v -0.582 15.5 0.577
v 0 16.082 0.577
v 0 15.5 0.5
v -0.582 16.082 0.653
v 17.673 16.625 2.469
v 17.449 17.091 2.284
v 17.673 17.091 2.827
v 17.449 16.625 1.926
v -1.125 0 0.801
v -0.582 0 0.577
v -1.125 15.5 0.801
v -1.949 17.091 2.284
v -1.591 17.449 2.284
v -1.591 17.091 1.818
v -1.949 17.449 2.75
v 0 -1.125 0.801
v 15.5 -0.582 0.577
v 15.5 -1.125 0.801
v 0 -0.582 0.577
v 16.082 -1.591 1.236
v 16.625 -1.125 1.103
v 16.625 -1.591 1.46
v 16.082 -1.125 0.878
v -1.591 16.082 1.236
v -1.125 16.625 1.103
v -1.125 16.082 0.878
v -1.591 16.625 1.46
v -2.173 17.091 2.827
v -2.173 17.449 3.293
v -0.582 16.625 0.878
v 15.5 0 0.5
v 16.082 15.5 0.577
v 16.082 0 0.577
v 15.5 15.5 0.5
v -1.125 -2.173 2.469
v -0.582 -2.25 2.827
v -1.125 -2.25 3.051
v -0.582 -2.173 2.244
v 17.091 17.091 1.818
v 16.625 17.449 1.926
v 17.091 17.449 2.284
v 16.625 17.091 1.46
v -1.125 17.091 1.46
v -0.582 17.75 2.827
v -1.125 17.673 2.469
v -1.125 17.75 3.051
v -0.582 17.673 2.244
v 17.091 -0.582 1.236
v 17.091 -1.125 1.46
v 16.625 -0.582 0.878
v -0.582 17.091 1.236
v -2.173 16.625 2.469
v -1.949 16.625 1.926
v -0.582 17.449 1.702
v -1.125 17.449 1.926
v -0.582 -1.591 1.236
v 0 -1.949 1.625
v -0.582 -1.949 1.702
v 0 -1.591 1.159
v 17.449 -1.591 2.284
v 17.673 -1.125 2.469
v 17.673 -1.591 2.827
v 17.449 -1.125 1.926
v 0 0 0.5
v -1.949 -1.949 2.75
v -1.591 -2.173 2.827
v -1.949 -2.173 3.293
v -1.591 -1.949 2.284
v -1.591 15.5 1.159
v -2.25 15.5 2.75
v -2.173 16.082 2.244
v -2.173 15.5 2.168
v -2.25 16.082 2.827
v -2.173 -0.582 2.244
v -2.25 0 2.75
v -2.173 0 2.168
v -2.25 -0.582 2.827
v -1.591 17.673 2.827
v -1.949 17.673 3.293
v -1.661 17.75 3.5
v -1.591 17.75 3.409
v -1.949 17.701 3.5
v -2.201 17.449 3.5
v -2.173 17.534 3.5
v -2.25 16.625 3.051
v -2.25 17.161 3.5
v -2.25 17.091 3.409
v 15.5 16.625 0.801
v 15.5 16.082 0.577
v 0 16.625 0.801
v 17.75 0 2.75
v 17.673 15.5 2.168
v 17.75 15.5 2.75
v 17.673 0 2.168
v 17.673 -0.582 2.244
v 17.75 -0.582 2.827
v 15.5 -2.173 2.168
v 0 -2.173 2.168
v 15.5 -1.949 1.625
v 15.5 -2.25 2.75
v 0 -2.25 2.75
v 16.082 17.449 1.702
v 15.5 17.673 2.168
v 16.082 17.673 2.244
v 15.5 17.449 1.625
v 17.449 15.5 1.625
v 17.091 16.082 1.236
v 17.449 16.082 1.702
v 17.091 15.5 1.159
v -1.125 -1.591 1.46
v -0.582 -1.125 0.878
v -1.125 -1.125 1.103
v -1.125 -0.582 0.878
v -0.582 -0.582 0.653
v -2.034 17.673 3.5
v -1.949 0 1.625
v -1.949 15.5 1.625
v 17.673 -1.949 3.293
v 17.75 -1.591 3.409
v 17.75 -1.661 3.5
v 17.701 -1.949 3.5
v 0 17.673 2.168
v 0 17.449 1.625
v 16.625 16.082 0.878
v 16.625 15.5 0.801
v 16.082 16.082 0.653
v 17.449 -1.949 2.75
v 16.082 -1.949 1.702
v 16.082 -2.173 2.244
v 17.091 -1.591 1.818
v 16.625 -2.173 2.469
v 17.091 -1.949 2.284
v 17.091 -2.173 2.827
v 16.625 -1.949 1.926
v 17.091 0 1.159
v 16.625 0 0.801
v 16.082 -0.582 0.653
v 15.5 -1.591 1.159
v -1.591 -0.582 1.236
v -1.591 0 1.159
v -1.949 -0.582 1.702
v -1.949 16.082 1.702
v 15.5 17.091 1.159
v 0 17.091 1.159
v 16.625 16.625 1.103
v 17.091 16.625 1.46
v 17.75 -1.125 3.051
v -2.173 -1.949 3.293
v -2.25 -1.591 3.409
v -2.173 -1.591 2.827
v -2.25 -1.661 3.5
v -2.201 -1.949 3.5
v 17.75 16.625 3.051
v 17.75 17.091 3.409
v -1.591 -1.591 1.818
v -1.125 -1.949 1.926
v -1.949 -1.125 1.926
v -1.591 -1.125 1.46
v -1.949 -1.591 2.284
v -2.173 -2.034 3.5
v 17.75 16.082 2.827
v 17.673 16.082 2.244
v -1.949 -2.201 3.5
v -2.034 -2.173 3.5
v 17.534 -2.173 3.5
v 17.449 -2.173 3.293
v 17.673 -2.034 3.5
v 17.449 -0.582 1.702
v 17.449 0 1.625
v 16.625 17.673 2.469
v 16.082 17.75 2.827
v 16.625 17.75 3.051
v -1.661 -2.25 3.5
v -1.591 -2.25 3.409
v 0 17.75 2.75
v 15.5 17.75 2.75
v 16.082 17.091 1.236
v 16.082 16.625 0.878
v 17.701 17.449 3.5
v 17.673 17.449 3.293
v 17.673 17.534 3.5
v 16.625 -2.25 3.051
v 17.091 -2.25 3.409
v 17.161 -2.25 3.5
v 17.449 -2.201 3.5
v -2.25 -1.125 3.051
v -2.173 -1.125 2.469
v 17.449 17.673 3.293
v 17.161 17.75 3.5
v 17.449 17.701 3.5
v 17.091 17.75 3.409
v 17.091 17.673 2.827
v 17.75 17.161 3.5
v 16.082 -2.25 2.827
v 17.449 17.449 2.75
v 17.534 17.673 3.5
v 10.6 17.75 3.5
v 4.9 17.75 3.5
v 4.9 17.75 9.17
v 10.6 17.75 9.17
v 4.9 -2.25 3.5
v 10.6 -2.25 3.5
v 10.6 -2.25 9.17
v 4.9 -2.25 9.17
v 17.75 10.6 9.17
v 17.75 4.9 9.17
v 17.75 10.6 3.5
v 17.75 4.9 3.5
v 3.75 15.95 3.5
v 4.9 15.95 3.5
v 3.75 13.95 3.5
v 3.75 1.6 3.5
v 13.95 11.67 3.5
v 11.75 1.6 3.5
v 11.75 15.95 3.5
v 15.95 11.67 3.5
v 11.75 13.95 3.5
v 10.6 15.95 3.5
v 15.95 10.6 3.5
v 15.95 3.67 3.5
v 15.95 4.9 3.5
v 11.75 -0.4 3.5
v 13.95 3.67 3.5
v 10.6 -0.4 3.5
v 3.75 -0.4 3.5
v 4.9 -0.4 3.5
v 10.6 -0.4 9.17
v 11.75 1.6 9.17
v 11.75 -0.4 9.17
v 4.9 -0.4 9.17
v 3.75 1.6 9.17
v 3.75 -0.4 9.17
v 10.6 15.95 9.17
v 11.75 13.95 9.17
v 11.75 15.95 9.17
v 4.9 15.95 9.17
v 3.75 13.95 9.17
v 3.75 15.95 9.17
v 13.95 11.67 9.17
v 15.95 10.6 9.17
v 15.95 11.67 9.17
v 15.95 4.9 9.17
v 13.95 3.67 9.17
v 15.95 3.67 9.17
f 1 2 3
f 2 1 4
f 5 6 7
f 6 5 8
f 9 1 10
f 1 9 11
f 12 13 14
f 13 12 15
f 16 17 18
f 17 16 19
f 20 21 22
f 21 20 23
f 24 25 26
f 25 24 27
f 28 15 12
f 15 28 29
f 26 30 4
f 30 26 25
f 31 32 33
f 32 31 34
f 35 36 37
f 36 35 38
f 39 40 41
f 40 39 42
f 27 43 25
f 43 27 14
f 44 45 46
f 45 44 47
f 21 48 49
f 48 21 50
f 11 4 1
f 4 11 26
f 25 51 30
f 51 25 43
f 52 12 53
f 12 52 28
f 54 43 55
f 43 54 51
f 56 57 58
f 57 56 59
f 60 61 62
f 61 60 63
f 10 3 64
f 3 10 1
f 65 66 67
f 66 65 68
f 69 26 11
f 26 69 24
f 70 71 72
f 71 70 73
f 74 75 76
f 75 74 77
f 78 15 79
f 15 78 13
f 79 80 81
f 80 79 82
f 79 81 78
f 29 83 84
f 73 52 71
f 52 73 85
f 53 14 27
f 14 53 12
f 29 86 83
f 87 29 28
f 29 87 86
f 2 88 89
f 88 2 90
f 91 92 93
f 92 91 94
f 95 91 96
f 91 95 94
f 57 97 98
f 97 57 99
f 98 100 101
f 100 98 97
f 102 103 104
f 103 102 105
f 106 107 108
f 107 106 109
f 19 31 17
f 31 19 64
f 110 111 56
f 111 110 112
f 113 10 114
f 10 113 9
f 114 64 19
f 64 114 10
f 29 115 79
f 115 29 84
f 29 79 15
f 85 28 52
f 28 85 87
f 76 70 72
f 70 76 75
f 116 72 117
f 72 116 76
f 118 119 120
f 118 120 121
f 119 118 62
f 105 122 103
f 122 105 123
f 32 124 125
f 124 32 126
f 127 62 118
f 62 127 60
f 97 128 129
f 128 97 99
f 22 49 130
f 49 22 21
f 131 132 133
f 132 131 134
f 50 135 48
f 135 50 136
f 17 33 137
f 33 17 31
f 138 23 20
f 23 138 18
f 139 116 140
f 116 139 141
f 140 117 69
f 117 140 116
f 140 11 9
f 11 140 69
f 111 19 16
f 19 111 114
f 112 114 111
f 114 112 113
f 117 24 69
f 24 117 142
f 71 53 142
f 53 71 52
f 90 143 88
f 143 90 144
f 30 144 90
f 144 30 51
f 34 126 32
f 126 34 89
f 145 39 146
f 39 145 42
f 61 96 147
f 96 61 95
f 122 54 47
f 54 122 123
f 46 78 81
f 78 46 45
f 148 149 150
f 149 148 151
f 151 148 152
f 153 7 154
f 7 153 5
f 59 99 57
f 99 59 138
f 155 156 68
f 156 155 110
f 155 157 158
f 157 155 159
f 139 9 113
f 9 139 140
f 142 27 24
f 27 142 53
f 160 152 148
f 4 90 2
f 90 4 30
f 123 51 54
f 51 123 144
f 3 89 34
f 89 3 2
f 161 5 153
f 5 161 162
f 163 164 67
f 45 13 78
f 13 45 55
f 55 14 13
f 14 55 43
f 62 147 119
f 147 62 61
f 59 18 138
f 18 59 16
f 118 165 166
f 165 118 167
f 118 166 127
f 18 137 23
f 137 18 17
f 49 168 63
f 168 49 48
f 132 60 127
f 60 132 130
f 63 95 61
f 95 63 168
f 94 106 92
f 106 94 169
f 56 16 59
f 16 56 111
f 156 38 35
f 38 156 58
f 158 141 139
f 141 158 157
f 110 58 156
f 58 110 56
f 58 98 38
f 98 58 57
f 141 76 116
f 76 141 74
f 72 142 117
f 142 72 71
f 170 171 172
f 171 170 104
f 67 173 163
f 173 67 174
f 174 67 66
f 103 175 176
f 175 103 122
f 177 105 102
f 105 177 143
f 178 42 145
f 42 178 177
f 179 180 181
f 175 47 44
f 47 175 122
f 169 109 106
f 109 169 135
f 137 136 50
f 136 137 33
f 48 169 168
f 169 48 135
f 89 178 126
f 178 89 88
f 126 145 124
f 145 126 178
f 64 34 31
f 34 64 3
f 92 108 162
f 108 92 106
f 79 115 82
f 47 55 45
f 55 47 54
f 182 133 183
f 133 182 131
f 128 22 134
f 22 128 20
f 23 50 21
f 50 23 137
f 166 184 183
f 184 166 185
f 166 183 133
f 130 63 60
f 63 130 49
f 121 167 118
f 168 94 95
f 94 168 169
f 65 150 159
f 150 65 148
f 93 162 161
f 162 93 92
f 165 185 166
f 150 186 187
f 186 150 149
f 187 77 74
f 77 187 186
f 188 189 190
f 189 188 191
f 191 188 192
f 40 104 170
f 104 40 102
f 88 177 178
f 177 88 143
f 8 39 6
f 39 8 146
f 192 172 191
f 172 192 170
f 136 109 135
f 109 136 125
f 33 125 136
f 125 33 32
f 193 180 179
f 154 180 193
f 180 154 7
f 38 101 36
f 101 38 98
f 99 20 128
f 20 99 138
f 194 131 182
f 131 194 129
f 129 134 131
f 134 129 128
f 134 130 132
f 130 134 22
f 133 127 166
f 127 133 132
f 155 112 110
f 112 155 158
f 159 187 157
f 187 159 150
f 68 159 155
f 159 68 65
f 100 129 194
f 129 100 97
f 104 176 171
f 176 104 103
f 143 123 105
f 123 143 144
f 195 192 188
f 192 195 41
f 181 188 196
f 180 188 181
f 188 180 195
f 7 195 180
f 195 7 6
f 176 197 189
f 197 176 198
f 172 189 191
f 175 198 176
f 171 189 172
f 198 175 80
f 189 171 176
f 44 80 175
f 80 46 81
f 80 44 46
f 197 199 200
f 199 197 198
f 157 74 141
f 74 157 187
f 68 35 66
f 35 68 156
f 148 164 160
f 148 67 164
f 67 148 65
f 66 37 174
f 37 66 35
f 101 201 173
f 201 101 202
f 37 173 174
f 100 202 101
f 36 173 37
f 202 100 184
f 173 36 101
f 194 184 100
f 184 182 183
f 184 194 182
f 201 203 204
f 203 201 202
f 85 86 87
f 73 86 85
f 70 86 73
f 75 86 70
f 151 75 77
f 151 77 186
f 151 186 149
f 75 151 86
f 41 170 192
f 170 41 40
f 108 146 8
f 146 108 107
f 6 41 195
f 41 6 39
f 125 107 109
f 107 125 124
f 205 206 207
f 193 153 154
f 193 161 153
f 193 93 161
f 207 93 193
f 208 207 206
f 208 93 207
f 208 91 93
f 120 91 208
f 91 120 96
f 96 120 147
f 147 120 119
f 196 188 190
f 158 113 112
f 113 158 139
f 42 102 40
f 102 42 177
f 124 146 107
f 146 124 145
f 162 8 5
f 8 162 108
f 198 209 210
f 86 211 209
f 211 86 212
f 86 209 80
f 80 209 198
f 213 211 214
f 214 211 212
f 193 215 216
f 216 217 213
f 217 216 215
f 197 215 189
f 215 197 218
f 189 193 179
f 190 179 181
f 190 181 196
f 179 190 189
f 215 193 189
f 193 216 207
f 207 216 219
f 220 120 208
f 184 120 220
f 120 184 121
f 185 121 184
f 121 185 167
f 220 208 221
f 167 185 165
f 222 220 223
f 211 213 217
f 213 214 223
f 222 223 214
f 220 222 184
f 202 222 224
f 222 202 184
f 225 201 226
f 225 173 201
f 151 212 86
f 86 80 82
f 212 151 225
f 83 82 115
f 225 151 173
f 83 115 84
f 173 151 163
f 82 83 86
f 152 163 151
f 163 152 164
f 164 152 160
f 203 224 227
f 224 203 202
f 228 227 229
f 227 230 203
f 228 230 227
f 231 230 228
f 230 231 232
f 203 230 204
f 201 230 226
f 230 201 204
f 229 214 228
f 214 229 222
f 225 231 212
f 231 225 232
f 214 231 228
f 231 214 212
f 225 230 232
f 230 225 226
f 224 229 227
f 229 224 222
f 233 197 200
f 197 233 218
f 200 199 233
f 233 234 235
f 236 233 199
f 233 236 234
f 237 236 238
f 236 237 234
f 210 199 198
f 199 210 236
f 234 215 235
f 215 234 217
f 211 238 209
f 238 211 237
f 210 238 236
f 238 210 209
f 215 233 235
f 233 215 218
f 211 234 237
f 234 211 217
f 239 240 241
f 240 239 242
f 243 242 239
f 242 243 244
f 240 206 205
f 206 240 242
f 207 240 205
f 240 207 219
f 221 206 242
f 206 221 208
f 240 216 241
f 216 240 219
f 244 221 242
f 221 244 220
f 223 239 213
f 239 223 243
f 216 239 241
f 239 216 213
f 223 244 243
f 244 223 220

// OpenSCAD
$fn=24;
module chamfercube(){
minkowski(){
minkowski(){
cube([5.5,5.5,5]);
rotate([-90,0,0])
cylinder(d=4.5,h=10);
}
rotate([0,90,0])
cylinder(d=4.5,h=10);
}
}
module ex2020(){
color([1,0,0,1])
translate([7.75,7.75,21.5])
scale([1,1,0.05])
import("/mnt/genesis/Dropbox/STLs/FuseBox1.3_2020/files/SCAD/NFS5-2020-360.stl");
}
module footbase(){
translate([0,0,5]){
difference(){
chamfercube();
translate([-3,-3,-1.5])
cube([22,22,15]);
}
}
}


footbase();
translate([4.9,-2.25,3.47])
cube([5.7,2.2,5.7]);
translate([3.75,-0.4,3.47])
cube([8,2,5.7]);

translate([4.9,15.55,3.47])
cube([5.7,2.2,5.7]);
translate([3.75,13.95,3.47])
cube([8,2,5.7]);

translate([15.55,4.9,3.47])
cube([2.2,5.7,5.7]);
translate([13.95,3.67,3.47])
cube([2,8,5.7]);

//ex2020();
